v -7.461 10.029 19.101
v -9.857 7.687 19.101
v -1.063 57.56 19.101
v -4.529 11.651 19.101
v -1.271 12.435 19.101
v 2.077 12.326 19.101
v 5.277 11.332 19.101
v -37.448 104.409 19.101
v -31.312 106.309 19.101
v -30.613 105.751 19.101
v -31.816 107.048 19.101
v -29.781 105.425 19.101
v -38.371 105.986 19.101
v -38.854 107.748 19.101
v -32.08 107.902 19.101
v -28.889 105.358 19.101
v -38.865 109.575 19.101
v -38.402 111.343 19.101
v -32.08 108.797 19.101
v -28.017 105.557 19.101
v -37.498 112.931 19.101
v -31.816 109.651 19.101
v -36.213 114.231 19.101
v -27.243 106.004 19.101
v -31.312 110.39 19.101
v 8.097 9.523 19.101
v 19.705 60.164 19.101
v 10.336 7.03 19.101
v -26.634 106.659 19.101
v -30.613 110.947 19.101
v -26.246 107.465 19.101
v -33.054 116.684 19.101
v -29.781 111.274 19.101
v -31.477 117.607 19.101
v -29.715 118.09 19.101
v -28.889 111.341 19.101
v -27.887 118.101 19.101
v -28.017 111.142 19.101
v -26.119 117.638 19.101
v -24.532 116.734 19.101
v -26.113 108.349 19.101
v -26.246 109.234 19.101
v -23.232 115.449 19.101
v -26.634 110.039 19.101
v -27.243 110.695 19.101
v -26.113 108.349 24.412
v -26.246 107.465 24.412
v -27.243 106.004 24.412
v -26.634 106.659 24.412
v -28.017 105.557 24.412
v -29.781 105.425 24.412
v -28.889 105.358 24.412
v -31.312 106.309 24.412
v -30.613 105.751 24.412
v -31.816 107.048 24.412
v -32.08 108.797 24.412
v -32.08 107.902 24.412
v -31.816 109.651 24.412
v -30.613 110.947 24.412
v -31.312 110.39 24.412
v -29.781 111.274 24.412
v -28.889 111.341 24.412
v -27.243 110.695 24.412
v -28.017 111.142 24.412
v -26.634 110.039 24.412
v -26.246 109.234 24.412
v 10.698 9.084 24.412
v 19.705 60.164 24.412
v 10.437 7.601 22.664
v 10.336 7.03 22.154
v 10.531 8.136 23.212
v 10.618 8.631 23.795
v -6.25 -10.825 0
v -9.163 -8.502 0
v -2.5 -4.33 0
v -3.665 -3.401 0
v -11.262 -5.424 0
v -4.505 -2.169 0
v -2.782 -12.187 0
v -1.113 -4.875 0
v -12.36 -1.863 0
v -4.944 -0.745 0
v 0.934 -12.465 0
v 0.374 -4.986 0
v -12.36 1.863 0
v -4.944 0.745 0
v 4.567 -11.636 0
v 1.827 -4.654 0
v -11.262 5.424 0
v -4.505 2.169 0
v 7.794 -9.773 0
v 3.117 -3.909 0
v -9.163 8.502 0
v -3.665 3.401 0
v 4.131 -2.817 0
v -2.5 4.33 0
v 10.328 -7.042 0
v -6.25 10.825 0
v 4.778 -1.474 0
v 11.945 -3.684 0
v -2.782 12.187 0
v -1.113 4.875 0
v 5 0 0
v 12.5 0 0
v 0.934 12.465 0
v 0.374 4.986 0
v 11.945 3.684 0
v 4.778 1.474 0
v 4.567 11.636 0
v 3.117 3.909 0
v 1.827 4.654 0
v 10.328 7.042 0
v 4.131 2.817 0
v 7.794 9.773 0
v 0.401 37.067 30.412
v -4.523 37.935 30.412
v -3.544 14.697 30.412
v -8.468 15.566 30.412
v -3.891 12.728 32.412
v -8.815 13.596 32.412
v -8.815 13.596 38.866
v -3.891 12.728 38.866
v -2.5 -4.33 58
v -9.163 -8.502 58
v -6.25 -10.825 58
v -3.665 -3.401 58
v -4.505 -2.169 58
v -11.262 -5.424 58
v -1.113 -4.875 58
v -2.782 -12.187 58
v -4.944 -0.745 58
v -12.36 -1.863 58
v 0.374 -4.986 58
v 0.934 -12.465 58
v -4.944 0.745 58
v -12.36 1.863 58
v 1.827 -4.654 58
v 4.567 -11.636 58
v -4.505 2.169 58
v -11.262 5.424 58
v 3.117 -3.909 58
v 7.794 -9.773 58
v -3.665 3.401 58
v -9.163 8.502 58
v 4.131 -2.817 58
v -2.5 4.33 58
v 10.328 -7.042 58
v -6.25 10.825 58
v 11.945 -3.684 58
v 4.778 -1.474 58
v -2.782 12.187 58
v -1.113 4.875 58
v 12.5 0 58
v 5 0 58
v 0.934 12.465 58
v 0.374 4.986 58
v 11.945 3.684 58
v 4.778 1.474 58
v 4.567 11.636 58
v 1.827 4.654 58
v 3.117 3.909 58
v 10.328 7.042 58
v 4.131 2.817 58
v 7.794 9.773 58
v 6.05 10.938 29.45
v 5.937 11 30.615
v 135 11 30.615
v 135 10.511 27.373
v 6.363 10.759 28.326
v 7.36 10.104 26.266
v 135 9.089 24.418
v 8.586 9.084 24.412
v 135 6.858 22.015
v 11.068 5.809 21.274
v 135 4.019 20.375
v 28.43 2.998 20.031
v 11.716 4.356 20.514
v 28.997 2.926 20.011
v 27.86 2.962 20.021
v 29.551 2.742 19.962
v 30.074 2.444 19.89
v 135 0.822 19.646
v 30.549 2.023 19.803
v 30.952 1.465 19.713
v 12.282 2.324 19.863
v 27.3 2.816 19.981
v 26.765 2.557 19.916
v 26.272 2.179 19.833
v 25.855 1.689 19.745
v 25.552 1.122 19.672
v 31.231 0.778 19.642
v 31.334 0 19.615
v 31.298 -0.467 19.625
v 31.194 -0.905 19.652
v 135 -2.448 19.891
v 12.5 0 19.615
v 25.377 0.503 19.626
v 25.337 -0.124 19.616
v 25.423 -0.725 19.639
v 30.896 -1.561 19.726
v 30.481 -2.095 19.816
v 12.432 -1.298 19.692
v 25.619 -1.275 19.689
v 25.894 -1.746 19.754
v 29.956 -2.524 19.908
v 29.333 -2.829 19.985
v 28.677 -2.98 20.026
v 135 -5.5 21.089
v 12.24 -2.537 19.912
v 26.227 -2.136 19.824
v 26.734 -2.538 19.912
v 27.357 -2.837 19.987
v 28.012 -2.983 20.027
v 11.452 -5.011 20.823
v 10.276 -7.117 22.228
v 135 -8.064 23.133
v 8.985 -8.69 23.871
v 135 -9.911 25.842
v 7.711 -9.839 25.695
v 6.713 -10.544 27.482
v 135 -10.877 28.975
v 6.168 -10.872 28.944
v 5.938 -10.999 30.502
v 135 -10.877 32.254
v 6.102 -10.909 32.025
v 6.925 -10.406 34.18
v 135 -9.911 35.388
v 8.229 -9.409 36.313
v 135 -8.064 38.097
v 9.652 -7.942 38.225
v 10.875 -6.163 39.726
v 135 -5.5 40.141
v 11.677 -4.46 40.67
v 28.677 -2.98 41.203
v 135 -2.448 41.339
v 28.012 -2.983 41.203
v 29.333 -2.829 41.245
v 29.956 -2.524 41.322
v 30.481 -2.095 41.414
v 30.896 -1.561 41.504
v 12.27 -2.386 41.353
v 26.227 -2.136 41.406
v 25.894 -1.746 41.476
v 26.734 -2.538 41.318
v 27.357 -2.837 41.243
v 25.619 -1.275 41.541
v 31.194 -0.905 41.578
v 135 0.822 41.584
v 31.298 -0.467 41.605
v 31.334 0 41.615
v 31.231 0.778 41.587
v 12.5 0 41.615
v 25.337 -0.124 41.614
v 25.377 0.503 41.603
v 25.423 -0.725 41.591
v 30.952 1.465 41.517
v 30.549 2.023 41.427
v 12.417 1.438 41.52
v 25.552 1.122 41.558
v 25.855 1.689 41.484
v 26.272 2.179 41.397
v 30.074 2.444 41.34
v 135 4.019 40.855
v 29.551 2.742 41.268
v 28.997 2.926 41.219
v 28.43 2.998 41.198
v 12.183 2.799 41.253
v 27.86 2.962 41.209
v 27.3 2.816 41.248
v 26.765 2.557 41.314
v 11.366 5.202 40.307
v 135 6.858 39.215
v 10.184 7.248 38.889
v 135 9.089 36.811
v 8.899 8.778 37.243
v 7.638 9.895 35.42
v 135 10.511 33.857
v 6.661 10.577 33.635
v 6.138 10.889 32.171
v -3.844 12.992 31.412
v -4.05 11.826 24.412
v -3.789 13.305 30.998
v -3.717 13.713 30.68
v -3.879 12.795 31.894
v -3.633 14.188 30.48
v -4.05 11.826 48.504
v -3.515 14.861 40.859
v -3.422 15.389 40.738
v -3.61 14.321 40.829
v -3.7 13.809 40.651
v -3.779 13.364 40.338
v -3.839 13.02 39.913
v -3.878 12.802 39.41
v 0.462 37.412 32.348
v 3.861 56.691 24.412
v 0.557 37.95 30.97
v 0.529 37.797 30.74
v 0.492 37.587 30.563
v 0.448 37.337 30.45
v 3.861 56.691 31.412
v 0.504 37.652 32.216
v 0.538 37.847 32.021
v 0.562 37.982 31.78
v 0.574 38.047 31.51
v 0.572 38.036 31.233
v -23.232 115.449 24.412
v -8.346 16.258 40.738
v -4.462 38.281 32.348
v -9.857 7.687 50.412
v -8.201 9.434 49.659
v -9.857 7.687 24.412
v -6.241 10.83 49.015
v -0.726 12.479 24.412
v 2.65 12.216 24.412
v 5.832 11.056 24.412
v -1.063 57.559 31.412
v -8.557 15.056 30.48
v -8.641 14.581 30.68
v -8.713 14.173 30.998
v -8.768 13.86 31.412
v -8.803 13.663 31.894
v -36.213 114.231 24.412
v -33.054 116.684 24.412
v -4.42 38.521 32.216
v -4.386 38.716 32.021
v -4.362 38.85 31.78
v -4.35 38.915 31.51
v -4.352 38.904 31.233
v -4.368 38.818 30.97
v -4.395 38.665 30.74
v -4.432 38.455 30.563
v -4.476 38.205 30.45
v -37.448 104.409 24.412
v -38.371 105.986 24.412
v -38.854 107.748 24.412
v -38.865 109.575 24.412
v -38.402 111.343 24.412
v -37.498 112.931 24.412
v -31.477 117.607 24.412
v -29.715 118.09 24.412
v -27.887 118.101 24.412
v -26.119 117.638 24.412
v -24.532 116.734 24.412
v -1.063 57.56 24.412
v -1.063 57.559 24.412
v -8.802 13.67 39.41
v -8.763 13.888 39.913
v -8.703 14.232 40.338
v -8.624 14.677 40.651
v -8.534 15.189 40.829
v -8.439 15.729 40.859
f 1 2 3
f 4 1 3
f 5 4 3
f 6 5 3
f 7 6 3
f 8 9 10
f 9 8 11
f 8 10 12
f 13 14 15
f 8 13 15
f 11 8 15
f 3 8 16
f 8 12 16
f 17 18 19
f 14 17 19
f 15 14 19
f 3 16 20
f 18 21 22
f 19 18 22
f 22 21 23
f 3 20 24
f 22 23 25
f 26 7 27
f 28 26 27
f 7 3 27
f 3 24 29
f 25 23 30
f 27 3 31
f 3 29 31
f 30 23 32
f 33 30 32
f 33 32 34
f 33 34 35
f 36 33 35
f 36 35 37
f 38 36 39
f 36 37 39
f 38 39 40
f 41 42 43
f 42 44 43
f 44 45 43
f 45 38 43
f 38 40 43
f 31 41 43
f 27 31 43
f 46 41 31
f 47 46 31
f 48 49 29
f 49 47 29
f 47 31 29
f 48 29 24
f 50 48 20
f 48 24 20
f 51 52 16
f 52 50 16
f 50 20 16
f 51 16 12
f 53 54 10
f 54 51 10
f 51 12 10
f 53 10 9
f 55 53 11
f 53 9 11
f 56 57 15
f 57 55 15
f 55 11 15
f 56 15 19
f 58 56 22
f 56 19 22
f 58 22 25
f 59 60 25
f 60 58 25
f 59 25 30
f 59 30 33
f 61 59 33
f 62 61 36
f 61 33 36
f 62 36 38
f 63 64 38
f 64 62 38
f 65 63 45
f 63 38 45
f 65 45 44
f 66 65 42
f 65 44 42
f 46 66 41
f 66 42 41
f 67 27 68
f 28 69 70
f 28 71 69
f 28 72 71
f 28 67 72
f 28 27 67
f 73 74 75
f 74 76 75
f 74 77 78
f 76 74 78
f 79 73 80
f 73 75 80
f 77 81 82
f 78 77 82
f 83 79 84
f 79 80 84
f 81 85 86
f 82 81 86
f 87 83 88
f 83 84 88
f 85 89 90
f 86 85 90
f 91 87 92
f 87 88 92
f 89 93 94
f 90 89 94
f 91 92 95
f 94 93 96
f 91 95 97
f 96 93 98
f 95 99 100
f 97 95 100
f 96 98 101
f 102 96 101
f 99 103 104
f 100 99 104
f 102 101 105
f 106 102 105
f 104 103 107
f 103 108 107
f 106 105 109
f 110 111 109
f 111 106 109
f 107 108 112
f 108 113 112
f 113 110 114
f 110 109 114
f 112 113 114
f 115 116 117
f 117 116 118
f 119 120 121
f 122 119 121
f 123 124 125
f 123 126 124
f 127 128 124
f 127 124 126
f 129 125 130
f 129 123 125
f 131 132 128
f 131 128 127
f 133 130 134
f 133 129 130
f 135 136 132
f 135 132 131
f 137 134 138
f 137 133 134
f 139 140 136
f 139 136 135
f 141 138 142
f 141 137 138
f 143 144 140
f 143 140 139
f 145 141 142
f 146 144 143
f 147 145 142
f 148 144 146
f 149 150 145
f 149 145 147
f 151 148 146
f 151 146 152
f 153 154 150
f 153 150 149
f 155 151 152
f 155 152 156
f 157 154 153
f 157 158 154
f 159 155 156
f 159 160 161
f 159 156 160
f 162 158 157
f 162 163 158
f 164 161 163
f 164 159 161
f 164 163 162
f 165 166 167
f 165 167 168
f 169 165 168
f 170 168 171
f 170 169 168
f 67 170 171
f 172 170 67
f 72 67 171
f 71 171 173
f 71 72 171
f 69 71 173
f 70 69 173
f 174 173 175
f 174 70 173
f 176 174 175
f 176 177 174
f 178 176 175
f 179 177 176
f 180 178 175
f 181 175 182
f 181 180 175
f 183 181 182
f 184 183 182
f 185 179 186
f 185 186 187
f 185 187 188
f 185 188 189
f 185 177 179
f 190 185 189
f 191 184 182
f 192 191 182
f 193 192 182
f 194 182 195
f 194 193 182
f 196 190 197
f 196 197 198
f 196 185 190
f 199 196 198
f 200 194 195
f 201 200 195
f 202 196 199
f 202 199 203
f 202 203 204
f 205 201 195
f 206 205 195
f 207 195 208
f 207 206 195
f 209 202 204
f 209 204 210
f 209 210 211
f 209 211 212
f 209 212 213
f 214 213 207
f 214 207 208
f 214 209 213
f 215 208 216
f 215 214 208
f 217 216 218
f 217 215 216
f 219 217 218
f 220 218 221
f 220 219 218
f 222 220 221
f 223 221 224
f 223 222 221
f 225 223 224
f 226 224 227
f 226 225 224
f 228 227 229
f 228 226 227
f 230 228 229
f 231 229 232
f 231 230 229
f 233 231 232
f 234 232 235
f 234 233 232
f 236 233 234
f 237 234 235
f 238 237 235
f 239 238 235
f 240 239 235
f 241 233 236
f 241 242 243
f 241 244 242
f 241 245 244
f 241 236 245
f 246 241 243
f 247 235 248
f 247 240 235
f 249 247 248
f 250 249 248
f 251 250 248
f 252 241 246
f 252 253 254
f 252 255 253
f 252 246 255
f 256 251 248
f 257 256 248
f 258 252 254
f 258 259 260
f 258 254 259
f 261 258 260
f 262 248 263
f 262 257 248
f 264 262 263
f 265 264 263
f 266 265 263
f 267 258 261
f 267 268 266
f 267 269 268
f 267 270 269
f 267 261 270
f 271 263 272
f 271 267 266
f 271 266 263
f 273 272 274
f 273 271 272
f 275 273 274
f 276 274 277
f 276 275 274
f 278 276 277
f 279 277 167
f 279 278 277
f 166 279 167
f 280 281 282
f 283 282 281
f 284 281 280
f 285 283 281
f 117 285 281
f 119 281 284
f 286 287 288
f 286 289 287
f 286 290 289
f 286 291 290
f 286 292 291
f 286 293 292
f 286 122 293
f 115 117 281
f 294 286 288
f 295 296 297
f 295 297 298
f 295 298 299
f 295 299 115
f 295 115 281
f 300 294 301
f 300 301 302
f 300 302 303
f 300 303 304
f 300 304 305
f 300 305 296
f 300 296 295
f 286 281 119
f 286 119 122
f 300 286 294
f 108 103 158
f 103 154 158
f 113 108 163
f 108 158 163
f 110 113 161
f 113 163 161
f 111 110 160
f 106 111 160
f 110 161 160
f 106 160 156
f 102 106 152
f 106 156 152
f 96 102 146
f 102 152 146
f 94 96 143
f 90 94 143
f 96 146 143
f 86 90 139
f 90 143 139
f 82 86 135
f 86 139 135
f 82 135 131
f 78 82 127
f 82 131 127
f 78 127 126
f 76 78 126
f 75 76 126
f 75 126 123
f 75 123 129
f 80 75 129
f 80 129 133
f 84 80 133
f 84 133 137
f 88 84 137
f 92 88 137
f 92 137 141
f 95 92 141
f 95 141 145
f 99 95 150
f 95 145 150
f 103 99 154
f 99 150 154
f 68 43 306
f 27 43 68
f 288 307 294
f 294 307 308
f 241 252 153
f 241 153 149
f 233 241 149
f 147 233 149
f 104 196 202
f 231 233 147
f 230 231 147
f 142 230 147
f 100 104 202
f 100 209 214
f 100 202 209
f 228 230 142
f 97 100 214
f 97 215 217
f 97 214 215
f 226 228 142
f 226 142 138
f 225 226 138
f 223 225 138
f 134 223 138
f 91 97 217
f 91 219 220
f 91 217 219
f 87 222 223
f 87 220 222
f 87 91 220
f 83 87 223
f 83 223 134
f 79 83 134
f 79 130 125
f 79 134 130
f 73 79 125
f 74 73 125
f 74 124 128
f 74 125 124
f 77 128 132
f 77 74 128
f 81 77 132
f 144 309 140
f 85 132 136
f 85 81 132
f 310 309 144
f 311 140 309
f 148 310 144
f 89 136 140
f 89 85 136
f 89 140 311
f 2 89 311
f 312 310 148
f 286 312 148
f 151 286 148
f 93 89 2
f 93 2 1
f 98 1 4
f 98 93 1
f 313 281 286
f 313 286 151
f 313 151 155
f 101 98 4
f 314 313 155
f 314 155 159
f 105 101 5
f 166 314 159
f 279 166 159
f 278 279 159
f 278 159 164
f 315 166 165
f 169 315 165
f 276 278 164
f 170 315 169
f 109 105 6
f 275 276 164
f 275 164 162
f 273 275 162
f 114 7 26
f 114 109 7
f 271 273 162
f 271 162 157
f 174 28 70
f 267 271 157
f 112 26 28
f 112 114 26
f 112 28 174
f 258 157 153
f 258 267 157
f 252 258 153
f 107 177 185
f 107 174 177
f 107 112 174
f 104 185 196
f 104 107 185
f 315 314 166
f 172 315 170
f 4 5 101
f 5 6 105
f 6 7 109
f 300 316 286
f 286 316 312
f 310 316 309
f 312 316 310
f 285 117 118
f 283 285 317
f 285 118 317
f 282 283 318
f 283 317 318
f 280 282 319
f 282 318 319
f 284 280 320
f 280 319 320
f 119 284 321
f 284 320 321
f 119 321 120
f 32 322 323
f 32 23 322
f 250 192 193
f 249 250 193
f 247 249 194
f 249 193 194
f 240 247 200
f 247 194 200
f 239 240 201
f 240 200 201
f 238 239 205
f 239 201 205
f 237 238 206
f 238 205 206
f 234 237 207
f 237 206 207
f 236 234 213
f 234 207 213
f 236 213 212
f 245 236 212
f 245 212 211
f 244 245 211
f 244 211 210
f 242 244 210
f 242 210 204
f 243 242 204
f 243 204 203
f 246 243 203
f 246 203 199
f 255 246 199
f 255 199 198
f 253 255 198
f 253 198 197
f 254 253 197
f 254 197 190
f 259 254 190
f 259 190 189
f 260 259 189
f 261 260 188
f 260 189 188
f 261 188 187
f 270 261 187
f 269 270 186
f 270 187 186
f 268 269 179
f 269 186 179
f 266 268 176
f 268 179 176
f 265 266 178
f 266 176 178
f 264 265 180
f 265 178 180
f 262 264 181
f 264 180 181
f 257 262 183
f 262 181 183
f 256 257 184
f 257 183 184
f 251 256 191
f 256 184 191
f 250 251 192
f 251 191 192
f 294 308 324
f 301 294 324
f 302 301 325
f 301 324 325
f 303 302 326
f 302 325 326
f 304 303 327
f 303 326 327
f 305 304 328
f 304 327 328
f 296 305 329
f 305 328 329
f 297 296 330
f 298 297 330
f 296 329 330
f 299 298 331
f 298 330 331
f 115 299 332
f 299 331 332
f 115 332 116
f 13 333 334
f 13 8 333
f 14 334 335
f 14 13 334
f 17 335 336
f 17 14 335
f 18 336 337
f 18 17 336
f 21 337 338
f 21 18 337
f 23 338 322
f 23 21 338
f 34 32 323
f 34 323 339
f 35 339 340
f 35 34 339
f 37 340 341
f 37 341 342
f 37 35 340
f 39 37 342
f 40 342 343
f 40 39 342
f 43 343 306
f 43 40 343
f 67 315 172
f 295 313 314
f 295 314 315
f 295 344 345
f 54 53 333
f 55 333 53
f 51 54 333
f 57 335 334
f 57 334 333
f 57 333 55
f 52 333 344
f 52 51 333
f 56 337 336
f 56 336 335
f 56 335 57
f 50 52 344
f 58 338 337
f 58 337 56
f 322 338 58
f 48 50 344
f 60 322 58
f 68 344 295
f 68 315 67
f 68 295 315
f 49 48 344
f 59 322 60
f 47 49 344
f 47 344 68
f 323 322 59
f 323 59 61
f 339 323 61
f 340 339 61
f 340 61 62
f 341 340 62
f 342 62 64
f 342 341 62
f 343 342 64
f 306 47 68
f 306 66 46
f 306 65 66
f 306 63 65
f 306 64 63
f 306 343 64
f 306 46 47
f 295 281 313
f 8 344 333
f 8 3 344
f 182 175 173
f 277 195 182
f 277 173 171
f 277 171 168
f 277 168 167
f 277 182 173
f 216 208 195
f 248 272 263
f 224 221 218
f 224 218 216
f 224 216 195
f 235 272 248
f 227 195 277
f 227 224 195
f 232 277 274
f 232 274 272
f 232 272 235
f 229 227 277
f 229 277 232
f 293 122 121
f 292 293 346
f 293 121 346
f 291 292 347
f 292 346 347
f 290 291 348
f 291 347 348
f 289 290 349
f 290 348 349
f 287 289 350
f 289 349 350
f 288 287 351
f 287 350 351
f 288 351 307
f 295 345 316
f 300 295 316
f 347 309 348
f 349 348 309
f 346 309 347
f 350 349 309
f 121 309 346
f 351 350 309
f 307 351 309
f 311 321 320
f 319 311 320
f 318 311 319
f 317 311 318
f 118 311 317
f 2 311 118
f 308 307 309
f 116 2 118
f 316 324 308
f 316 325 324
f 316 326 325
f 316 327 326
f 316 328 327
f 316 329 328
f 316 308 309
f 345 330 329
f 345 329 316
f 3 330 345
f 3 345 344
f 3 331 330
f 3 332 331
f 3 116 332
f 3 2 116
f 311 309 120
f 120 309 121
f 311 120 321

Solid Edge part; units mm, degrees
sketch "Sketch1" plane through (0, 0, 0) normal (0, 0, 1) x (1, 0, 0)
  circle A0 centre (0, 0) radius 12.5
extrude "Protrusion1" add sketch "Sketch1" along normal blind 58
sketch "Sketch2" plane through (0, 0, 0) normal (1, 0, 0) x (0, 1, 0)
  circle A0 centre (0, 30.6149) radius 11
extrude "ExtrudedProtrusion_2" add sketch "Sketch2" along normal blind 135
sketch "Sketch3" plane through (0, 0, 58) normal (0, 0, 1) x (1, 0, 0)
  circle A0 centre (0, 0) radius 5
extrude "ExtrudedCutout_1" cut sketch "Sketch3" against normal blind 74.8467
cosmetic_thread "Thread_1" size "Tr 22 x 8" thread depth 22
sketch "Sketch4" plane through (0, 0, 0) normal (0, 0, 1) x (1, 0, 0)
  circle A0 centre (28.334, 0) radius 3
extrude "ExtrudedCutout_2" cut sketch "Sketch4" along normal blind 57.1507
sketch "Sketch5" plane through (0, 0, 19.1008) normal (0, 0, 1) x (1, 0, 0)
  arc A0 (-10.1543, 6) -> (10.1543, 6) centre (0, 0) cw
  line L0 (19.7049, 60.1644) -> (10.1543, 6)
  line L1 (-23.2319, 115.4494) -> (19.7049, 60.1644)
  arc A1 (-33.0541, 116.6842) -> (-23.2319, 115.4494) centre (-28.7604, 111.1557) cw
  line L2 (-36.2132, 114.2307) -> (-33.0541, 116.6842)
  arc A2 (-36.2132, 114.2307) -> (-37.4481, 104.4085) centre (-31.9196, 108.7022) ccw
  line L3 (-1.0629, 57.5595) -> (-37.4481, 104.4085)
  line L4 (-10.1543, 6) -> (-1.0629, 57.5595)
  circle A3 centre (-29.1132, 108.3494) radius 3
  dimension "D1" = 70
  dimension "D2" = 20
  dimension "D3" = 55
  dimension "D4" = 7
  dimension "D5" = 7
  dimension "D6" = 18
  dimension "D7" = 6
  dimension "D8" = 6
  dimension "D9" = 9
extrude "ExtrudedProtrusion_3" add sketch "Sketch5" along normal blind 5.3111
sketch "Sketch6" plane through (-5.5858, 31.9091, 21.7563) normal (-0.9848, 0.1736, 0) x (-0.1736, -0.9848, 0)
  line L0 (24.5955, 2.6555) -> (-26.046, 2.6555)
  line L1 (-26.046, 2.6555) -> (-26.046, 9.6555)
  line L2 (-26.046, 9.6555) -> (24.5955, 28.6555)
  line L3 (24.5955, 28.6555) -> (24.5955, 2.6555)
  line L4 (-6.1187, 8.6555) -> (16.5955, 8.6555)
  arc A0 (16.5955, 8.6555) -> (18.5955, 10.6555) centre (16.5955, 10.6555) ccw
  line L5 (18.5955, 10.6555) -> (18.5955, 17.1095)
  arc A1 (15.893, 18.9821) -> (18.5955, 17.1095) centre (16.5955, 17.1095) cw
  line L6 (15.893, 18.9821) -> (-6.4699, 10.5918)
  arc A2 (-6.4699, 10.5918) -> (-6.1187, 8.6555) centre (-6.1187, 9.6555) ccw
  dimension "D1" = 26
  dimension "D2" = 7
  dimension "D3" = 6
  dimension "D4" = 6
  dimension "D5" = 6
  dimension "D6" = 2
  dimension "D7" = 2
  dimension "D8" = 1
extrude "ExtrudedProtrusion_5" add sketch "Sketch6" against normal blind 5
properties material "Steel"
